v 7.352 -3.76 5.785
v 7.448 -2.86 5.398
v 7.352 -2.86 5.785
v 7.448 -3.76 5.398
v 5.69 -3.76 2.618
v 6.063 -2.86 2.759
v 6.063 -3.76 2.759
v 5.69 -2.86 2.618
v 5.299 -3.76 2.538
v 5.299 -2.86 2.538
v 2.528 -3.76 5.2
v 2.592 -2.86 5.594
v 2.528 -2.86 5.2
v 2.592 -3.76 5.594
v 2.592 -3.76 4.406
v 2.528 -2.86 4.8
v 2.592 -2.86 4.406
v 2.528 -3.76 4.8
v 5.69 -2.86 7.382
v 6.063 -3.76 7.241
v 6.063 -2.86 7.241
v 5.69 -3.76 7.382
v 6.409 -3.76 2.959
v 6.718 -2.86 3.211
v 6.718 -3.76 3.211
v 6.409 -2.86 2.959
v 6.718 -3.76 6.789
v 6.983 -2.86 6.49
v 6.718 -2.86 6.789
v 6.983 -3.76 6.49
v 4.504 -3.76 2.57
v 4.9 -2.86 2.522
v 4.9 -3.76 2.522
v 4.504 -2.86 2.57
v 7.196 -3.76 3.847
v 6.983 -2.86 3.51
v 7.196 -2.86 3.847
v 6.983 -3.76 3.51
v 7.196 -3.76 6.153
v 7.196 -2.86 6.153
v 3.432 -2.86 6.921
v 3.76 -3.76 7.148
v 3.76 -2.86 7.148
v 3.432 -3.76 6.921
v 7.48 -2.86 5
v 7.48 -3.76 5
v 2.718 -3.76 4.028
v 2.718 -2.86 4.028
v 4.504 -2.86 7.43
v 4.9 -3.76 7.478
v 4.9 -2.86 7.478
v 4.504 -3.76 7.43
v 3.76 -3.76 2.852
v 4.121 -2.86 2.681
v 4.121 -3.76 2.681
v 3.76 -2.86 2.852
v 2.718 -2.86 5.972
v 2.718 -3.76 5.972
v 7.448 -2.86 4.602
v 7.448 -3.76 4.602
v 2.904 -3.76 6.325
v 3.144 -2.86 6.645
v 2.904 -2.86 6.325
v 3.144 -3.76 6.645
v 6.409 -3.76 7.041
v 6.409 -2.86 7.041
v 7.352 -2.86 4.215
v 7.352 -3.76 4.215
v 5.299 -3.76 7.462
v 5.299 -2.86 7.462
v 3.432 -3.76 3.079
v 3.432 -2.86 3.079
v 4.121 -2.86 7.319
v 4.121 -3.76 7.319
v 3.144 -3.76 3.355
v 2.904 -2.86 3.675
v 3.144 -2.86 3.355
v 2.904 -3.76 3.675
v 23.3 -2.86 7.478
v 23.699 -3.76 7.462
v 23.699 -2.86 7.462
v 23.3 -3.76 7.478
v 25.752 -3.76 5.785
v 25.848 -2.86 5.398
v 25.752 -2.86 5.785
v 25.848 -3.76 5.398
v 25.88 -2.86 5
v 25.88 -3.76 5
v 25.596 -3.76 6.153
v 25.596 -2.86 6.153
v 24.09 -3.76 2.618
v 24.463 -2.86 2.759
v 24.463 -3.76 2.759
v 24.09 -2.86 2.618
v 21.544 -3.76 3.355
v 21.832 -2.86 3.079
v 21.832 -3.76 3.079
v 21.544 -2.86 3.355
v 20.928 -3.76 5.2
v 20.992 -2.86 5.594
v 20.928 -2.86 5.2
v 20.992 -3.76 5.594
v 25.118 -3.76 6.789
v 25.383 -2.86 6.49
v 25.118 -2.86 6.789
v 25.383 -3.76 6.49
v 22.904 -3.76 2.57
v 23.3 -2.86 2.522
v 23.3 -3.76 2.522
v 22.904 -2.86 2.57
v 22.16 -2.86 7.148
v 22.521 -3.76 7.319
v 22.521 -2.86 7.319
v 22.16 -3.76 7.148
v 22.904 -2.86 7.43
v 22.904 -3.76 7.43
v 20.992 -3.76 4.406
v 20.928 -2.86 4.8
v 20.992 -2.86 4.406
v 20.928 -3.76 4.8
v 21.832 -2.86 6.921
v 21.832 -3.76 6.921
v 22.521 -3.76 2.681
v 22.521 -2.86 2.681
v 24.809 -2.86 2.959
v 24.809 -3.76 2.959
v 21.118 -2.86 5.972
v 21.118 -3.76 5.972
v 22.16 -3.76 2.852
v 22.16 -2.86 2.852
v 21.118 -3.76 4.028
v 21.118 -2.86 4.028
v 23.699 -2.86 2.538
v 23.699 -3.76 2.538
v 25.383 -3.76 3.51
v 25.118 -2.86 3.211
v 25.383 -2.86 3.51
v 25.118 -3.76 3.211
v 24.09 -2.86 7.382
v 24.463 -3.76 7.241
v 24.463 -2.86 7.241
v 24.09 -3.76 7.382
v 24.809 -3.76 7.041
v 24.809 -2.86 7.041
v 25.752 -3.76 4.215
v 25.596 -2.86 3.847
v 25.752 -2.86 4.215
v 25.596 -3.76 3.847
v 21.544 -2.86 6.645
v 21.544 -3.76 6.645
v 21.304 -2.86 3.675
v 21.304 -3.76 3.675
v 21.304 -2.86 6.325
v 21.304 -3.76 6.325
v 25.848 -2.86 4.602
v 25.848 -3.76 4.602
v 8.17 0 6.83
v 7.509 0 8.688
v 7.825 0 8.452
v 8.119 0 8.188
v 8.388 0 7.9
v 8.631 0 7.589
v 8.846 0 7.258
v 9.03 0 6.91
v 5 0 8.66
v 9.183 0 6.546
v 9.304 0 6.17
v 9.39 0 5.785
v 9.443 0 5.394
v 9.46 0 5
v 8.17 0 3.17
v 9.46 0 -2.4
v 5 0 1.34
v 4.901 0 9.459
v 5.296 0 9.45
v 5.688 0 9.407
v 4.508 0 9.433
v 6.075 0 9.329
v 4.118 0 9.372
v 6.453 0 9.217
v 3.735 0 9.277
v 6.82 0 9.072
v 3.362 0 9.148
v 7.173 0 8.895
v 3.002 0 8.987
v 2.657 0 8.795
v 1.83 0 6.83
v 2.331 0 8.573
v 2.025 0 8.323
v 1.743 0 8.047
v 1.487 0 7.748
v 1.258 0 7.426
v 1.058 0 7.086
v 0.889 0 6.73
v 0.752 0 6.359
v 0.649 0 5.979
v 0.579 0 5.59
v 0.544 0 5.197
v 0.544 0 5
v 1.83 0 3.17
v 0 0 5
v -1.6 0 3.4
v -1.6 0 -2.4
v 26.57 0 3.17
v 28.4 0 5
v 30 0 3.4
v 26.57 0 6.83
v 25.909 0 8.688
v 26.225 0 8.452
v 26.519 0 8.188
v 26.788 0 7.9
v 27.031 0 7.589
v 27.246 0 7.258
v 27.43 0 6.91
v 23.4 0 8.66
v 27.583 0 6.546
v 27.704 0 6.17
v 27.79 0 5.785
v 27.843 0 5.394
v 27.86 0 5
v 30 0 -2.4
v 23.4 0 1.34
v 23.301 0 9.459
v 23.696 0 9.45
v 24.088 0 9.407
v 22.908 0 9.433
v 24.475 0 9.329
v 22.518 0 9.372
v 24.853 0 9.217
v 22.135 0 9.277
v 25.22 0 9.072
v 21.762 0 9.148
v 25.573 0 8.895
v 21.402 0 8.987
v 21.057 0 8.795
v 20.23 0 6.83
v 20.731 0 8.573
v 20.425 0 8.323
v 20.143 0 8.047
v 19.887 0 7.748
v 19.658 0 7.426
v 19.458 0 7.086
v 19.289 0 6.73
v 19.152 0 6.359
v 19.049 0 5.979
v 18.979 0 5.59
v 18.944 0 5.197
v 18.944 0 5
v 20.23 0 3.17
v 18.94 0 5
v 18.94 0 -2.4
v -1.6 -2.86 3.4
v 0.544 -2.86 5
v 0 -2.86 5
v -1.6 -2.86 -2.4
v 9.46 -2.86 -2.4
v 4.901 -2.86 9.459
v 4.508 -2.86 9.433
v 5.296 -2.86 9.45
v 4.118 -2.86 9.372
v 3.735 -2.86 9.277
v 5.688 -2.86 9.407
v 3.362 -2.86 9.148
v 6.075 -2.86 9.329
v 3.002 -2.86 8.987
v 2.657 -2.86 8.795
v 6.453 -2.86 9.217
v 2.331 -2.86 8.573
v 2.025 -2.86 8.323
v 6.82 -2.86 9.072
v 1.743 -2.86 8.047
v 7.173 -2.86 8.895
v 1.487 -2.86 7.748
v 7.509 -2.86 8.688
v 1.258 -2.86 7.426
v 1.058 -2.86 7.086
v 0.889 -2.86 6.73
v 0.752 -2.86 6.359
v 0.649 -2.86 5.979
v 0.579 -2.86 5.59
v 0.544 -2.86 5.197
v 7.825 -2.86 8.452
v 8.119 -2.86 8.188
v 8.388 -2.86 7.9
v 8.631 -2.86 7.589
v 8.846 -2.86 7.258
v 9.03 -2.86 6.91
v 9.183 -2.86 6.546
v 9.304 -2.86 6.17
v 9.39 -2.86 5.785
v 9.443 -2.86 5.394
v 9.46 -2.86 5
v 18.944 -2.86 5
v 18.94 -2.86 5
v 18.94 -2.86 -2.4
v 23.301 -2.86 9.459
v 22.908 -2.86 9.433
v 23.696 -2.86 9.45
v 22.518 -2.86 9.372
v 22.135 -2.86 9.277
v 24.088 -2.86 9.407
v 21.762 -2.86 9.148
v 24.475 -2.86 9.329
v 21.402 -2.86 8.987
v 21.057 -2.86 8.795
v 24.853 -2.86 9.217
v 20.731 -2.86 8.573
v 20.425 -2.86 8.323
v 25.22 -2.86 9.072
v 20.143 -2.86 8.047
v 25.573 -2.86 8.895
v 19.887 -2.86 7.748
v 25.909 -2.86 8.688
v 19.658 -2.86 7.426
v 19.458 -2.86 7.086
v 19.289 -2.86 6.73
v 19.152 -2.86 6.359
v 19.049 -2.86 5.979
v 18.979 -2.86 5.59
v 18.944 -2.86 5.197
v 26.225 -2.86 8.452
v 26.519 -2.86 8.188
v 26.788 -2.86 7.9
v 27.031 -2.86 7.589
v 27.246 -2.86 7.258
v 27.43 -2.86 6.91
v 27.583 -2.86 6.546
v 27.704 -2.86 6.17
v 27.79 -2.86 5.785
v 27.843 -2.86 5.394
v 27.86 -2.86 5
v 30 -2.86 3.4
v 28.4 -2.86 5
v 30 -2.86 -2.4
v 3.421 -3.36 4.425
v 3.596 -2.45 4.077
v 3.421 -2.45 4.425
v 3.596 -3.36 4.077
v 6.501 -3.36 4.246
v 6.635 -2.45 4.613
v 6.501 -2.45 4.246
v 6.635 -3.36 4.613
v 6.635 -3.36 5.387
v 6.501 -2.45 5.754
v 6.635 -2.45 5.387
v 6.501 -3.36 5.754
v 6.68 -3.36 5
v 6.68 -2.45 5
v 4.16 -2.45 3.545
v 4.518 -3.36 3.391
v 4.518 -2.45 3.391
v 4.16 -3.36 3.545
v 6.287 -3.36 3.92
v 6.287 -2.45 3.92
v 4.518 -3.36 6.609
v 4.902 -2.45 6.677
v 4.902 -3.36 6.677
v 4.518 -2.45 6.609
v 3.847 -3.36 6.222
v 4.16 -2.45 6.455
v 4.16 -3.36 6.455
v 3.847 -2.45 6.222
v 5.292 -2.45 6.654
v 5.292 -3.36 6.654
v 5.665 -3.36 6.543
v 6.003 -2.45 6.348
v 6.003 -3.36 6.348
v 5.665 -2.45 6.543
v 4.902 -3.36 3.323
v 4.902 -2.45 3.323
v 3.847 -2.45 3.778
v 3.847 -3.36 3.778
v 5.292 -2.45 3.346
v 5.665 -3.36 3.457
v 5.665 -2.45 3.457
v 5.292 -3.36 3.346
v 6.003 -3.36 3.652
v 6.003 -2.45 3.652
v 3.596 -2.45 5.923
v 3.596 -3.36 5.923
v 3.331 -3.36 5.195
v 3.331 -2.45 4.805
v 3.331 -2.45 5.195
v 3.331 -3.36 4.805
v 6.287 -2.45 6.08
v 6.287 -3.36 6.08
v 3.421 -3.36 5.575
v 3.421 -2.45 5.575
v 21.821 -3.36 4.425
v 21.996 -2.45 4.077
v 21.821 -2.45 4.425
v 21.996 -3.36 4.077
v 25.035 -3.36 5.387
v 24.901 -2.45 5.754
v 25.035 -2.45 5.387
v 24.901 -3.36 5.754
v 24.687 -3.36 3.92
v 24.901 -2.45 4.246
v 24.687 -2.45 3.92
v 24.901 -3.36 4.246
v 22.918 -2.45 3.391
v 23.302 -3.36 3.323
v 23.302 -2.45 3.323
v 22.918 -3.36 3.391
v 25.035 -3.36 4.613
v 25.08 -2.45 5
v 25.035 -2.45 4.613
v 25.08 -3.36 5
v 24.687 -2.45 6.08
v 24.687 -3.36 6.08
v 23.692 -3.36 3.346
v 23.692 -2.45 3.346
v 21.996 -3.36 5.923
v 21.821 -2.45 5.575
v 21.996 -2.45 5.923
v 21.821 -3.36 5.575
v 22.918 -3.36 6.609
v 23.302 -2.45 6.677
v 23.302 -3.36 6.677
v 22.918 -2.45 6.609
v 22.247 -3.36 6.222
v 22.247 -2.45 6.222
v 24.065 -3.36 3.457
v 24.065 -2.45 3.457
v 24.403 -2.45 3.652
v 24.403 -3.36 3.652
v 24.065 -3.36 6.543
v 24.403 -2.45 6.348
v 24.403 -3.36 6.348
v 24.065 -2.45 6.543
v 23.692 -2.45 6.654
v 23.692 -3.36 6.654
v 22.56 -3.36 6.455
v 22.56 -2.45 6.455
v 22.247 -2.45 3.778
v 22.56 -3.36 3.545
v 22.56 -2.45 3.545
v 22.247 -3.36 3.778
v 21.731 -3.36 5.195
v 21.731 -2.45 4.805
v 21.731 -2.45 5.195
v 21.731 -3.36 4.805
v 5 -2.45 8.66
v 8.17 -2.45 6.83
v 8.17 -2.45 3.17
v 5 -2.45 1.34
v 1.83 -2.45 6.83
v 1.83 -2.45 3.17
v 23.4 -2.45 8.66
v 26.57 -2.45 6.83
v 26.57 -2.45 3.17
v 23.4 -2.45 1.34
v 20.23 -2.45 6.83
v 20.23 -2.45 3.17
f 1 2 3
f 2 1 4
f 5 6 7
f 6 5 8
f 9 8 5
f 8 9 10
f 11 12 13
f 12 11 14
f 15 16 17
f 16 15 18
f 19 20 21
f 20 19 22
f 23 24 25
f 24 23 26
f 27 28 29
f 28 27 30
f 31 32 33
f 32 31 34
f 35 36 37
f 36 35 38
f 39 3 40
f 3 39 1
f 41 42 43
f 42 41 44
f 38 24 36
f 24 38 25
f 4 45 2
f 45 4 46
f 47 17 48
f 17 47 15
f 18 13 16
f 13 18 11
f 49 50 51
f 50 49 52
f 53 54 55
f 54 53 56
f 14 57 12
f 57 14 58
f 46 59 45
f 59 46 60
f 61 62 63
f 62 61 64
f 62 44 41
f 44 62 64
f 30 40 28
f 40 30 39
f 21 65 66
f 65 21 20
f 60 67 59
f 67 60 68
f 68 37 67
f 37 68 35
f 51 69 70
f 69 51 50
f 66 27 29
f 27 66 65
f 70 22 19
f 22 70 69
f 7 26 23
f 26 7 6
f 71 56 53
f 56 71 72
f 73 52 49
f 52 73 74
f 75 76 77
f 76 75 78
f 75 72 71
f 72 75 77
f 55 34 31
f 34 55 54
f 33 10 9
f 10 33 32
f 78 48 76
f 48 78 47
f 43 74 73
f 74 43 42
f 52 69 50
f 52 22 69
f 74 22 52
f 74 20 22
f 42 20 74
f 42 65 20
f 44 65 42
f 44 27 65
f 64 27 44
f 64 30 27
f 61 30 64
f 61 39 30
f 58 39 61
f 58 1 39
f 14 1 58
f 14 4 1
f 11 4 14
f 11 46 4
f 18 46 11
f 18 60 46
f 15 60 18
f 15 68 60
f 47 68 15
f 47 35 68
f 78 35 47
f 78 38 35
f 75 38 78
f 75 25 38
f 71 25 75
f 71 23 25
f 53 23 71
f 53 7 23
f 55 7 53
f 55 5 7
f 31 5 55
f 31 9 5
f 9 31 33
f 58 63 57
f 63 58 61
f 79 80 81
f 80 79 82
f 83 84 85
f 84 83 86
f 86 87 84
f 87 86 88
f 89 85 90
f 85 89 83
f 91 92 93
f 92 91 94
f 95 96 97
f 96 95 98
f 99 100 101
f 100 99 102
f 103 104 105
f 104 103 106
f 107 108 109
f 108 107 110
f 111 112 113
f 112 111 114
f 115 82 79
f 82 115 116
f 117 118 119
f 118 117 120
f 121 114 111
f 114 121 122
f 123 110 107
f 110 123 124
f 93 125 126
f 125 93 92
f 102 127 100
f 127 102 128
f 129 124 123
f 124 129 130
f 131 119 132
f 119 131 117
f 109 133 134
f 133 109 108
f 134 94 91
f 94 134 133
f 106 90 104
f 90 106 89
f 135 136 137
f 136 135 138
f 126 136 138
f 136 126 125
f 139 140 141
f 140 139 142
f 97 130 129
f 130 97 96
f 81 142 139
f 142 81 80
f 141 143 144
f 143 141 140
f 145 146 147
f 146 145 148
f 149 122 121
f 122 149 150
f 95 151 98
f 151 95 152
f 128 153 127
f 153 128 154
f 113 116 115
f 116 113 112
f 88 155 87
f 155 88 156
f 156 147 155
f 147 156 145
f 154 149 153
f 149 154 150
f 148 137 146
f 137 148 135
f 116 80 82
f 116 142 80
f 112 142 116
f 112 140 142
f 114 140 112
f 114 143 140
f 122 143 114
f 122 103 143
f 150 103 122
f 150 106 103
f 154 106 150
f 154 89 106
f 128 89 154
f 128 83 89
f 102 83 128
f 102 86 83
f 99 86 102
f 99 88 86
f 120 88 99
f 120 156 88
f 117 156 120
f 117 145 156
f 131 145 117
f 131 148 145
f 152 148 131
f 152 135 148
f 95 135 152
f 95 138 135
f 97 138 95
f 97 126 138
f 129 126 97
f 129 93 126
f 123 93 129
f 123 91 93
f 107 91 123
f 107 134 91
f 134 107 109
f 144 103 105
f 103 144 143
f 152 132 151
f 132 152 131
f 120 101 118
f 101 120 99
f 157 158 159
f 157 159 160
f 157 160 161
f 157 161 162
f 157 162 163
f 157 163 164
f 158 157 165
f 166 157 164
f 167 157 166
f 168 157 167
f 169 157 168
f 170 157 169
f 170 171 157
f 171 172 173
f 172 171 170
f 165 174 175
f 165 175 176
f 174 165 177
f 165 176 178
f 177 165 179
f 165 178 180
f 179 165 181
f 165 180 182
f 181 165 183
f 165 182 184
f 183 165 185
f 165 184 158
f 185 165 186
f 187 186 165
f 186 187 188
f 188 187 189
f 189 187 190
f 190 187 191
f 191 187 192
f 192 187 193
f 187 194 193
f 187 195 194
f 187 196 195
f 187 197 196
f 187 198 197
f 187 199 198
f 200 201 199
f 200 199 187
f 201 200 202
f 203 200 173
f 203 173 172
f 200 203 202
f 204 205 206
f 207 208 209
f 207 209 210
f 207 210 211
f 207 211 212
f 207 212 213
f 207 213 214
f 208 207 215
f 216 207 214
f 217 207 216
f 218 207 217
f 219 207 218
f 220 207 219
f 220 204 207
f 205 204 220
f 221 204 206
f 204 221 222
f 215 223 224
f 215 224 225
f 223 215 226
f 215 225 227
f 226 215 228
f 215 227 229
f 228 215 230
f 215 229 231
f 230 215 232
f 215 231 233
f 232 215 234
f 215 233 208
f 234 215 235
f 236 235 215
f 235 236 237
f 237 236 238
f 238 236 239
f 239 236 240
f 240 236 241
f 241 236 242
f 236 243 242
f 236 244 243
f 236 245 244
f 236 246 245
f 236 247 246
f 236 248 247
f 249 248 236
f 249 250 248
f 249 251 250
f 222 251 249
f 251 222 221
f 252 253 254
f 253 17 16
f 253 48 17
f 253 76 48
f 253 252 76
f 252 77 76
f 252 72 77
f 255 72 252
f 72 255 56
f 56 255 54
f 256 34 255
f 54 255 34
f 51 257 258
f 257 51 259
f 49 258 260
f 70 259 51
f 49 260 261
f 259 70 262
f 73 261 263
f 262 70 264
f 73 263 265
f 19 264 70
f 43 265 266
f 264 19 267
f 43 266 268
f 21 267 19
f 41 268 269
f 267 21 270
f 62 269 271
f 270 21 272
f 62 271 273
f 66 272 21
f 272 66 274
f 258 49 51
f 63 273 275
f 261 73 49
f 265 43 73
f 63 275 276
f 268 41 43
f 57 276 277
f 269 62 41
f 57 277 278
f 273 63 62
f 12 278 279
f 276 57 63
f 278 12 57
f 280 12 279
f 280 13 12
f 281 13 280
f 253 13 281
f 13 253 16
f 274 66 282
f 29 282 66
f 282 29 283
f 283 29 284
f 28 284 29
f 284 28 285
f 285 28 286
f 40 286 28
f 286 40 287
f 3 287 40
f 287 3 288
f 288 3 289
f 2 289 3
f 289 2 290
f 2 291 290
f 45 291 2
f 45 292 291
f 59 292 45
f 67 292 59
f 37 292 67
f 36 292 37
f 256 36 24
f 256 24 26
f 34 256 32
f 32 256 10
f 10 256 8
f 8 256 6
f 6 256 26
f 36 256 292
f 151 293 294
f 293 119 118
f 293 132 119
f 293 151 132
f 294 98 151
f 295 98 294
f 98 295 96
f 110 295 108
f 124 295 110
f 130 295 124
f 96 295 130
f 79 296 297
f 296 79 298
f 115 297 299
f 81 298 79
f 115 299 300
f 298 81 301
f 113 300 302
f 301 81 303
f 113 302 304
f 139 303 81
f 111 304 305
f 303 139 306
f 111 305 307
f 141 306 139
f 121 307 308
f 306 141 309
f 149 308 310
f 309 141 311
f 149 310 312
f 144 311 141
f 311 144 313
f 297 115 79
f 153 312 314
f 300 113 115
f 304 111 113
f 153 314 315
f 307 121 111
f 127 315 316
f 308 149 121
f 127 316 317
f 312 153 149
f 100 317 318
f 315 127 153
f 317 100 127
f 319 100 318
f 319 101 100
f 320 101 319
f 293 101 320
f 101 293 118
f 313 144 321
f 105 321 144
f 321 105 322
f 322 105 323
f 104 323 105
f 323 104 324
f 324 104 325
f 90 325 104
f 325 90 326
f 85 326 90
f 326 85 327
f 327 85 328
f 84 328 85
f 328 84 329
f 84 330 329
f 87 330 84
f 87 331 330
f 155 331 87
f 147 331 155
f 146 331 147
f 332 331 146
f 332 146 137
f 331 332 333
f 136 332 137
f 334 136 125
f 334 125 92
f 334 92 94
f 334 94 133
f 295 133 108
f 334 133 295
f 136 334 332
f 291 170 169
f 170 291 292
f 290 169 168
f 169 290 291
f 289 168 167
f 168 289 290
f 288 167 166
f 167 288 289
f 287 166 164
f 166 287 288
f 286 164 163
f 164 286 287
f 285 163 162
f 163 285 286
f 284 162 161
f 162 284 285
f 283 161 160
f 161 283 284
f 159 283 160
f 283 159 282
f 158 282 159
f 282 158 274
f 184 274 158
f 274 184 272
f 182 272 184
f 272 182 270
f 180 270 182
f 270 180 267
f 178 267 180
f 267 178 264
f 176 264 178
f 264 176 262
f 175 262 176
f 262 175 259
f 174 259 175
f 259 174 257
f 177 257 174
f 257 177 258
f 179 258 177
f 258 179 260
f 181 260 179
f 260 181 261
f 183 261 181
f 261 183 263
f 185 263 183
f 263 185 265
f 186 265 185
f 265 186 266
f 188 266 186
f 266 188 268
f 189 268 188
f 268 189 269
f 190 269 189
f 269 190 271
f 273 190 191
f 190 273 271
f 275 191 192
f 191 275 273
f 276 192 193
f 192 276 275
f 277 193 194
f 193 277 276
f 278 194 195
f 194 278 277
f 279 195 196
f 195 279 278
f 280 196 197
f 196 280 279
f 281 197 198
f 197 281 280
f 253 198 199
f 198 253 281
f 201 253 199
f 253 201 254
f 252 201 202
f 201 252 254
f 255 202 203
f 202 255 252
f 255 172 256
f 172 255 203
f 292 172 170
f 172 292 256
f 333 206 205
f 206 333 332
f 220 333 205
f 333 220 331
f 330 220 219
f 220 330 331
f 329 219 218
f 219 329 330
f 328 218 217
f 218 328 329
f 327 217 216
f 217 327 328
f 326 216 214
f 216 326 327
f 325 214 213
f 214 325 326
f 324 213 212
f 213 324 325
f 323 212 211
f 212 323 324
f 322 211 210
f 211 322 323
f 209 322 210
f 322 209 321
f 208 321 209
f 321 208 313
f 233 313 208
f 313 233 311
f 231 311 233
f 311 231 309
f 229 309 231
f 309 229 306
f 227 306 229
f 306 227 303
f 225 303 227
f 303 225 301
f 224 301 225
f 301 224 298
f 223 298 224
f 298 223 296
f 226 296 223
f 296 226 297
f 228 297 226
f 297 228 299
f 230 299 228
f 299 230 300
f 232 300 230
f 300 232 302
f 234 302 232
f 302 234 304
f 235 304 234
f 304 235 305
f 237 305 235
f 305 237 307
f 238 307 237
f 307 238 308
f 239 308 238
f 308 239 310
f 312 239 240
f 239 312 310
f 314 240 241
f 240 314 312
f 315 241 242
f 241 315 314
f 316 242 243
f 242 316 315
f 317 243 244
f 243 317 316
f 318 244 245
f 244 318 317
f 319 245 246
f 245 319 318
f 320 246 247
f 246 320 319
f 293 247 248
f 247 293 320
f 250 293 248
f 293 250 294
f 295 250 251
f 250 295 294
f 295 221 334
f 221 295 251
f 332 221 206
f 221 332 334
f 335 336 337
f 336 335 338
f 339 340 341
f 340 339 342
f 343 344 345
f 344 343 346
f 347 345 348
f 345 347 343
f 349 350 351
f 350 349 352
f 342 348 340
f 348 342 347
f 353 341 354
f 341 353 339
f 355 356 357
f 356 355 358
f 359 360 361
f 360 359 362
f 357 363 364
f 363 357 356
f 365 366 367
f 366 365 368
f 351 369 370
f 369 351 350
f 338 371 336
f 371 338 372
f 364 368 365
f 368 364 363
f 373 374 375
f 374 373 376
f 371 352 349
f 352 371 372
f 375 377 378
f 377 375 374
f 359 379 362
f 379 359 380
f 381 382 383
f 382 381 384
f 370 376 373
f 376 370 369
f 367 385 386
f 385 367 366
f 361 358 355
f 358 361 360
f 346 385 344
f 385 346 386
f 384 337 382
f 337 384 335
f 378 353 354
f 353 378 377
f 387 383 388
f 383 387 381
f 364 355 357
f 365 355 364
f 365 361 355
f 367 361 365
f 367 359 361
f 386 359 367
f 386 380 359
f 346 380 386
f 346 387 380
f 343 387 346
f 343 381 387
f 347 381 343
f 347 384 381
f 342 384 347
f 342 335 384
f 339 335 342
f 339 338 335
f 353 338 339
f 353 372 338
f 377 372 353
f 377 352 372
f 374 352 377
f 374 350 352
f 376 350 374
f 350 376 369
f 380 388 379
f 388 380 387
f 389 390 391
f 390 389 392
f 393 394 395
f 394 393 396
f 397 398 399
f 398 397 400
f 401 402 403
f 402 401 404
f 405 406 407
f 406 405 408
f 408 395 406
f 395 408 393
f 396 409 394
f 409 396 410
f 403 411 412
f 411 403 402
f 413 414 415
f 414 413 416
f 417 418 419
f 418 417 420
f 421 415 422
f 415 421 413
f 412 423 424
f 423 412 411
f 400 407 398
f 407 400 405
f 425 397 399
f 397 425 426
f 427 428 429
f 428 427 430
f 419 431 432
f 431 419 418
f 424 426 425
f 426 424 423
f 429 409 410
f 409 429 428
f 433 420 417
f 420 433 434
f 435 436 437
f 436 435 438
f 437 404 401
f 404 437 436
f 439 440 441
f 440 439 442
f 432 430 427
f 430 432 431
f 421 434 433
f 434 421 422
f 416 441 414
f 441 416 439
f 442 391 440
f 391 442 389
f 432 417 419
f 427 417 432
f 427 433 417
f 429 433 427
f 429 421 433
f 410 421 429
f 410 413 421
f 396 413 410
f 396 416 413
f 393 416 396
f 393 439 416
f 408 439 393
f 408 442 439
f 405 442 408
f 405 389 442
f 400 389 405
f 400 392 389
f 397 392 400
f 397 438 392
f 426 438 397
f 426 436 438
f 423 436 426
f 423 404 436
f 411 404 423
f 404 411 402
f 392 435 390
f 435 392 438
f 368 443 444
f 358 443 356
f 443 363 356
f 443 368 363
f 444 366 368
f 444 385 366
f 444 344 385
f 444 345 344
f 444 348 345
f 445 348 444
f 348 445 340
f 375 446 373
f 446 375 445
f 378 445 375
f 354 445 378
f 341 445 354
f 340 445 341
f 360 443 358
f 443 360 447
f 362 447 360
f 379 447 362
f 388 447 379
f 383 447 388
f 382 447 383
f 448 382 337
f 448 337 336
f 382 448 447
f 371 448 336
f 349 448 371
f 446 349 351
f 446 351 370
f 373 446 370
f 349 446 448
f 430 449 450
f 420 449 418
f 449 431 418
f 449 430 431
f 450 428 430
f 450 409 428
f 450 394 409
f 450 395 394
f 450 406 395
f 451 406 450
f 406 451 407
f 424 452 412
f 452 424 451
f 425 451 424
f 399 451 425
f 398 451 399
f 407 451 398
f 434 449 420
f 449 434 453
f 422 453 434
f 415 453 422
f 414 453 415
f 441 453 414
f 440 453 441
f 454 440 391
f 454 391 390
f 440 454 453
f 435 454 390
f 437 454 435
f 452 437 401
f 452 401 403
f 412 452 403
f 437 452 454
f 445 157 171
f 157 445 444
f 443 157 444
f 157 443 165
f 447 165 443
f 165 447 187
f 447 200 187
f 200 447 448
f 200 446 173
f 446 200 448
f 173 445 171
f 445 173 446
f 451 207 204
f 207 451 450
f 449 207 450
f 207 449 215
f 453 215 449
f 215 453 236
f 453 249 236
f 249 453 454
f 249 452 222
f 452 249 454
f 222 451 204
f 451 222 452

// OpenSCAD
// Copyright (C) 2025 Arif K. Rafiq
// This program is free software: you can redistribute it and/or modify
// it under the terms of the GNU General Public License as published by
// the Free Software Foundation, either version 3 of the License, or
// (at your option) any later version.

// This program is distributed in the hope that it will be useful,
// but WITHOUT ANY WARRANTY; without even the implied warranty of
// MERCHANTABILITY or FITNESS FOR A PARTICULAR PURPOSE.  See the
// GNU General Public License for more details.

// You should have received a copy of the GNU General Public License
// along with this file.  If not, see <https://www.gnu.org/licenses/>,
// or write to: license@temperedoptimism.com


/* 
(b)readth       :(w)est (X-)   (c)enter (X0) (e)east (X+)
(h)eight        :(d)own (Z-)   (g)round(Z0)  (u)p (Z+)

Vectors (v)     :(x), (y), (z)
Thicknesses (t) : Thicknesses to resolve 3D printer limits or rendering issues.
Proportion (p)  : container for grouping (r)adius and (i)ntensity into a singl 2d vector acccessed using .x and .y respectively
*/
/* 17:08 */
// Fixed in example3.scad       // Set limits in customizer
/* [Thicknesses (x),(y),(z)] */
tFitGap = [0.16, 0.16, 0.16];   //[0.00:0.01:0.64] 
tWallMin = [0.40, 0.40, 0.16];  //[0.16:0.08:1.60] 
/* [Proportional (x):(Radius, (y):(i)ntensity] */
pHexSink = [3.5, 2.3];          //[0.10:0.02:20.00] 
pFastShaft = [1.36, 5.80]; //0.10:0.02:20.00]
pWashSink = [4.00, 1.00]; //0.10:0.02:20.00]
/* [2D vectors (x), (y)] */
vTerminalW = [5.0, 5.0];        //[0.00:0.10:100] 
vTerminalE = [23.4, 5.0];       //[0.00:0.10:100] 
/* [Scalars] */
leadingEdge = 2.4; //[0.8:0.4:5.0]
flankEdge = 1.6; //[0.8:0.4:5.0]
bBoard = 28.4; //[20:0.1:100.0]
hBoard = 1.6; //0.8:04:3.2]
/* [Special ] */
fa0 = 4.0;     //[1:1:60]  
fs0 = 0.4;     //[0.1:0.1:4.0]  
fx0 = 3;       //[1,2,3,4,5,6,7,8,9,10]
rCorner = 1.6; //0.1
/* [Hidden] */ 
tEps=0.01; 

/* Calucualted at run time. */
pHexSurround = [pHexSink.x + (tWallMin.x * 2) + tFitGap.x, pHexSink.y + tWallMin.y + tFitGap.y];
pExtension = [pFastShaft.x + ((tWallMin.x + tFitGap.x)* 2), pFastShaft.y + tWallMin.y + tFitGap.y - pHexSurround.y -hBoard - pWashSink.y];

//30.00-35.00 Circles, Also look at the customizer!!
// Rotate
rotate([90,0,0]){
  difference(){
    union() {
      // hex pocket surround
      linear_extrude(pHexSurround.y, convexity=fx0){ 
        polygon([[vTerminalW.x + pHexSurround.x, vTerminalW.y],
              [ vTerminalW.x + pHexSurround.x, -leadingEdge],
              [-flankEdge, -leadingEdge],
              [-flankEdge, vTerminalW.y - rCorner],
              [-flankEdge + rCorner, vTerminalW.y]]);
        polygon([[vTerminalE.x - pHexSurround.x, vTerminalE.y],
              [ vTerminalE.x - pHexSurround.x, -leadingEdge],
              [bBoard + flankEdge, -leadingEdge],
              [bBoard + flankEdge, vTerminalE.y - rCorner],
              [bBoard + flankEdge - rCorner, vTerminalE.y]]);       
              
        for(v = [vTerminalW, vTerminalE]){
          translate(v)  circle(pHexSurround.x, $fa=fa0, $fs=fs0 );
        }
      }
      // shaft extension
      for(v= [vTerminalW, vTerminalE]){
          translate([v.x, v.y, pHexSurround.y - tEps]) cylinder(pExtension.y + tEps, r=pExtension.x, $fa=fa0, $fs=fs0);
      }
    }
    //hex pocket
    // Solve Conflicting bodies
    // This could be a loop see: 16:05 in the Video:
    //  https://www.youtube.com/watch?v=R-gRqGRss1k   
    translate([0,0, -tEps]) linear_extrude(pHexSink.y + tFitGap.y, convexity=fx0){
      translate(vTerminalW)  rotate([0,0,30]) circle(pHexSink.x + tFitGap.y, $fn=6);
      translate(vTerminalE)  rotate([0,0,30]) circle(pHexSink.x + tFitGap.y, $fn=6);
    }
    // fastner hole
    for(v = [vTerminalW, vTerminalE]){
        #translate([v.x, v.y, -hBoard -pWashSink.y]) cylinder(pFastShaft.y + tFitGap.y, r=pFastShaft.x + (tFitGap.x * 2), $fa=fa0, $fs=fs0);
    }
  }
}
